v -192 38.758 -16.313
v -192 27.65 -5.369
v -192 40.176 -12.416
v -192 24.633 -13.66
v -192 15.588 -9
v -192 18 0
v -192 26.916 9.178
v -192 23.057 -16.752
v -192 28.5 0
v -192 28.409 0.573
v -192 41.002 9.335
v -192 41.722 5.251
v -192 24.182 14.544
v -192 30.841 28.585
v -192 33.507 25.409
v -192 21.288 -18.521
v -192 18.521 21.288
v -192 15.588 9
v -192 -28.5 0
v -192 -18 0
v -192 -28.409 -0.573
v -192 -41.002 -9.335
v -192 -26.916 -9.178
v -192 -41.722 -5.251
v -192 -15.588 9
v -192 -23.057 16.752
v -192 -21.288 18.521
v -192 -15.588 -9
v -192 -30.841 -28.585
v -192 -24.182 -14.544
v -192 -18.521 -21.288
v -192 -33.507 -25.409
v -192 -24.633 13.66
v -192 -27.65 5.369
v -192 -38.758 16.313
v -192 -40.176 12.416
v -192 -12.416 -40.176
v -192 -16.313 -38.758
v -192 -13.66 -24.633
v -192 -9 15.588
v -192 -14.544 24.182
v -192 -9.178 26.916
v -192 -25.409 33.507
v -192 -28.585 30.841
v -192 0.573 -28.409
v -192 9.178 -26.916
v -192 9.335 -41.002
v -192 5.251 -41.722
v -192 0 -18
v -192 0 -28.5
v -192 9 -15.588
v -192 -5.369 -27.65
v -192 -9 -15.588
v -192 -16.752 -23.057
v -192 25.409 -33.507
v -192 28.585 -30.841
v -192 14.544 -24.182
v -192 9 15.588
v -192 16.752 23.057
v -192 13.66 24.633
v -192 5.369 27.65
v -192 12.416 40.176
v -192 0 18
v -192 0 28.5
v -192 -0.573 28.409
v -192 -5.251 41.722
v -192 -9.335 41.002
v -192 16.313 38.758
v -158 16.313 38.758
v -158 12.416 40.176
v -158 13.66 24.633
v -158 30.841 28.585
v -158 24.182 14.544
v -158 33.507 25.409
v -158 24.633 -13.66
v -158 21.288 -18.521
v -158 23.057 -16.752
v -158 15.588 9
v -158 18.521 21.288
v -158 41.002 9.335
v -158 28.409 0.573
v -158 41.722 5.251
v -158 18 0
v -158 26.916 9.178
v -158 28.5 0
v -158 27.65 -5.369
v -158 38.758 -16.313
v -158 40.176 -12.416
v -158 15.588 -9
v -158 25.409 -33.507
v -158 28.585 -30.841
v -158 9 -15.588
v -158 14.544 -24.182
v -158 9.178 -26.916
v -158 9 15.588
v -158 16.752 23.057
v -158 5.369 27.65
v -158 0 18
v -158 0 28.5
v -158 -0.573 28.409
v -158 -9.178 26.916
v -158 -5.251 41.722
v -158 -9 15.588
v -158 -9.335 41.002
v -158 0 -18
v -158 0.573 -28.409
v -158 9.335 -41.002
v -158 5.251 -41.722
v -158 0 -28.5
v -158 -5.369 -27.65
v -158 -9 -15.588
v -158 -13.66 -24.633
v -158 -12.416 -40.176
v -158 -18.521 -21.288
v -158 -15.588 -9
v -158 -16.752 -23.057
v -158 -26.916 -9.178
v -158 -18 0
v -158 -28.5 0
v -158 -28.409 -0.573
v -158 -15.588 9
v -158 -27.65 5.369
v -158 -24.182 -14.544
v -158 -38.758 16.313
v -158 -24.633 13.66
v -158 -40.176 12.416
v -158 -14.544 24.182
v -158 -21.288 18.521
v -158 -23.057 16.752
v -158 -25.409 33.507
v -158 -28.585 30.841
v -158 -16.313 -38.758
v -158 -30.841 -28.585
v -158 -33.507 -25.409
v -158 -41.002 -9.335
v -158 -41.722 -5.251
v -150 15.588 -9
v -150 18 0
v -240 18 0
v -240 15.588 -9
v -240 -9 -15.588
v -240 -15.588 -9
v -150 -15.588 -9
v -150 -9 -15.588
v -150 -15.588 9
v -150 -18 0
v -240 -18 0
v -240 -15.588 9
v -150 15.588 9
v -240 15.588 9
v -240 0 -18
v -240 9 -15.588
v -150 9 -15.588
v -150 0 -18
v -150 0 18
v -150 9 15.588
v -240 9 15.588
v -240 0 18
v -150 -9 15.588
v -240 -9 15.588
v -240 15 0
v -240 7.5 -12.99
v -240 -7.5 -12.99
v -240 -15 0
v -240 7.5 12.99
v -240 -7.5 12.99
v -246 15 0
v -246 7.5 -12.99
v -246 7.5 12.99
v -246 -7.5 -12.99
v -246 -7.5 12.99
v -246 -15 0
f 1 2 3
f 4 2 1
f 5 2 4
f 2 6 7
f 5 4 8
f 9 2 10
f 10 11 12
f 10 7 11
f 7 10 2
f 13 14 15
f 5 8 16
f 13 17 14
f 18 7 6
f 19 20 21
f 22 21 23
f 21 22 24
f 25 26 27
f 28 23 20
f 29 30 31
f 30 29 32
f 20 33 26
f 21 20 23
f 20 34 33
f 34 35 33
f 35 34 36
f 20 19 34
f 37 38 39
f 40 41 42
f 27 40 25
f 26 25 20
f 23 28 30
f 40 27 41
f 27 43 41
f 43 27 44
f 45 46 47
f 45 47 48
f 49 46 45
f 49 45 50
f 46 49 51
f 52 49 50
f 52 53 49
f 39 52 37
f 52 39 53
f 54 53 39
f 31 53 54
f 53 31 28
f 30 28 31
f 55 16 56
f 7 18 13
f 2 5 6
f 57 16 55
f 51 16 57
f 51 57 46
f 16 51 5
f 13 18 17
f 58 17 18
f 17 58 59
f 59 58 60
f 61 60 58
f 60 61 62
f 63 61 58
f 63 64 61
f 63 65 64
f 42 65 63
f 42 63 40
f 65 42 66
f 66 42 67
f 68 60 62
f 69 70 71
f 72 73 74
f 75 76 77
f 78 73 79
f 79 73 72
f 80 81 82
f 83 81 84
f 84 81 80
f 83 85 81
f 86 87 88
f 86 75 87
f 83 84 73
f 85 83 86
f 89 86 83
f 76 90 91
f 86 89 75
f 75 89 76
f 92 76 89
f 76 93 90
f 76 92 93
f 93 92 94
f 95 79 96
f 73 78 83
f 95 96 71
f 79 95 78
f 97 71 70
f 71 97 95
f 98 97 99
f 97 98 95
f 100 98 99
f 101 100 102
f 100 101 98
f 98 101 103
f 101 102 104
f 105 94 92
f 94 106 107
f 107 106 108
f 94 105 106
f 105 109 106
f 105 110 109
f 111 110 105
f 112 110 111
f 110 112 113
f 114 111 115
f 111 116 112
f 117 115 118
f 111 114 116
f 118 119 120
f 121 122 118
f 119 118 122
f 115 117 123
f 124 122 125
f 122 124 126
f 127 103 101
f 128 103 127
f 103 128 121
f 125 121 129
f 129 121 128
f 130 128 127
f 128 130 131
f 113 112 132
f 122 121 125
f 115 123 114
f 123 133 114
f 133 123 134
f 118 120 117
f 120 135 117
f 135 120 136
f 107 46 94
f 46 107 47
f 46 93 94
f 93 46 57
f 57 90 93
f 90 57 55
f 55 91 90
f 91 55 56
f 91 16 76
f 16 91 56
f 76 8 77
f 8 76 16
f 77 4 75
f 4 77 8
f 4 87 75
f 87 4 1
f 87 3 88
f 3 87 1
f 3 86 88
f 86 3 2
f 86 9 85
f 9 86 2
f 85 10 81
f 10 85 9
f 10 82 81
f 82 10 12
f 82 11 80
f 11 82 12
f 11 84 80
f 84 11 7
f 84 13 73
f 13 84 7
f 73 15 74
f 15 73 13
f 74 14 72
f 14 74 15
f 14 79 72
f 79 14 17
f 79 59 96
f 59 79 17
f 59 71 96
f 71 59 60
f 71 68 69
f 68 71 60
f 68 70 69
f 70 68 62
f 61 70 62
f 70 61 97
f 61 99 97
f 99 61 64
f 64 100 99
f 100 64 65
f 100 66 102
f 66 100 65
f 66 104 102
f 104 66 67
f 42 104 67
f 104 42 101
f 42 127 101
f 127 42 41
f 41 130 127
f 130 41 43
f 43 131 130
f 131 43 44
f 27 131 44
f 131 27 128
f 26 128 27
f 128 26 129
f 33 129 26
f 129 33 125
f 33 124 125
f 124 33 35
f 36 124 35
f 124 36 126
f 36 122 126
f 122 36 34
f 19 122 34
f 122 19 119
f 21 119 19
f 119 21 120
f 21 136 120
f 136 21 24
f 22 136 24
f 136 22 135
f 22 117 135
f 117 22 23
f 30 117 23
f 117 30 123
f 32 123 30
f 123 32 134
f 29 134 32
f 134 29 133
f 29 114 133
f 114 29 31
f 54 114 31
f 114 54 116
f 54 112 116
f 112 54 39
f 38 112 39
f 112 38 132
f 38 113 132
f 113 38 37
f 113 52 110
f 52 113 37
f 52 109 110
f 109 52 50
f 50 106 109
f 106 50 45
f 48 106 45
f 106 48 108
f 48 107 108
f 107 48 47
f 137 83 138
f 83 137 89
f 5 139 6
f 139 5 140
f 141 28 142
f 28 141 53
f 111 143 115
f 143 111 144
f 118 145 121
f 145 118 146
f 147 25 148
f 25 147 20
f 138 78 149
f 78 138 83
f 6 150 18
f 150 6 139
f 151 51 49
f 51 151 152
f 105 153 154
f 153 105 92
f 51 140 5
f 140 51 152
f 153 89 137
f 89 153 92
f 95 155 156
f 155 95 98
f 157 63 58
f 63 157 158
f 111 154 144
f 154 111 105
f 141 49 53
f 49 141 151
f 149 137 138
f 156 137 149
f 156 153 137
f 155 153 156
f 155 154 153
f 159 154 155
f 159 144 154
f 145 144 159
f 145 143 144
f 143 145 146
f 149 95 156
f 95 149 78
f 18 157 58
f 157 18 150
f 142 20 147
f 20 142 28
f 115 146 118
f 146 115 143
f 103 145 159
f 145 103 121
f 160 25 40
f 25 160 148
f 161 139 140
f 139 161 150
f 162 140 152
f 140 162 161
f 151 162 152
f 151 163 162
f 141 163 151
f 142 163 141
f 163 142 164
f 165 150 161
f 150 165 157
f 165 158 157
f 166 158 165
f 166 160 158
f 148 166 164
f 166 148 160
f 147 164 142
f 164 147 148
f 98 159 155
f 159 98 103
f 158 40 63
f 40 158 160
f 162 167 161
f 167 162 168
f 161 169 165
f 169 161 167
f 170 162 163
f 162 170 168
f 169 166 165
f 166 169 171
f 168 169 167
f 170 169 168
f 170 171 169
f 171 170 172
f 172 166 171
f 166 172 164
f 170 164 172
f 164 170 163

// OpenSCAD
// Heavy Trunnion Mount - PINION group (third mesh; static gear train, turns about its own axis).
// Export: openscad.com -o heavy-trunnion-pinion.stl heavy-trunnion-pinion.scad
// Origin = pinion axis (model y -131, z -110 mm), axis parallel to X. Material: steel only.
// In the game the mod turns it by -3.75 x the elevation angle (sector R135 / pinion R36).
include <heavy-trunnion-lib.scad>
m = 0;
group_pinion(["all", "placed"][m]);
